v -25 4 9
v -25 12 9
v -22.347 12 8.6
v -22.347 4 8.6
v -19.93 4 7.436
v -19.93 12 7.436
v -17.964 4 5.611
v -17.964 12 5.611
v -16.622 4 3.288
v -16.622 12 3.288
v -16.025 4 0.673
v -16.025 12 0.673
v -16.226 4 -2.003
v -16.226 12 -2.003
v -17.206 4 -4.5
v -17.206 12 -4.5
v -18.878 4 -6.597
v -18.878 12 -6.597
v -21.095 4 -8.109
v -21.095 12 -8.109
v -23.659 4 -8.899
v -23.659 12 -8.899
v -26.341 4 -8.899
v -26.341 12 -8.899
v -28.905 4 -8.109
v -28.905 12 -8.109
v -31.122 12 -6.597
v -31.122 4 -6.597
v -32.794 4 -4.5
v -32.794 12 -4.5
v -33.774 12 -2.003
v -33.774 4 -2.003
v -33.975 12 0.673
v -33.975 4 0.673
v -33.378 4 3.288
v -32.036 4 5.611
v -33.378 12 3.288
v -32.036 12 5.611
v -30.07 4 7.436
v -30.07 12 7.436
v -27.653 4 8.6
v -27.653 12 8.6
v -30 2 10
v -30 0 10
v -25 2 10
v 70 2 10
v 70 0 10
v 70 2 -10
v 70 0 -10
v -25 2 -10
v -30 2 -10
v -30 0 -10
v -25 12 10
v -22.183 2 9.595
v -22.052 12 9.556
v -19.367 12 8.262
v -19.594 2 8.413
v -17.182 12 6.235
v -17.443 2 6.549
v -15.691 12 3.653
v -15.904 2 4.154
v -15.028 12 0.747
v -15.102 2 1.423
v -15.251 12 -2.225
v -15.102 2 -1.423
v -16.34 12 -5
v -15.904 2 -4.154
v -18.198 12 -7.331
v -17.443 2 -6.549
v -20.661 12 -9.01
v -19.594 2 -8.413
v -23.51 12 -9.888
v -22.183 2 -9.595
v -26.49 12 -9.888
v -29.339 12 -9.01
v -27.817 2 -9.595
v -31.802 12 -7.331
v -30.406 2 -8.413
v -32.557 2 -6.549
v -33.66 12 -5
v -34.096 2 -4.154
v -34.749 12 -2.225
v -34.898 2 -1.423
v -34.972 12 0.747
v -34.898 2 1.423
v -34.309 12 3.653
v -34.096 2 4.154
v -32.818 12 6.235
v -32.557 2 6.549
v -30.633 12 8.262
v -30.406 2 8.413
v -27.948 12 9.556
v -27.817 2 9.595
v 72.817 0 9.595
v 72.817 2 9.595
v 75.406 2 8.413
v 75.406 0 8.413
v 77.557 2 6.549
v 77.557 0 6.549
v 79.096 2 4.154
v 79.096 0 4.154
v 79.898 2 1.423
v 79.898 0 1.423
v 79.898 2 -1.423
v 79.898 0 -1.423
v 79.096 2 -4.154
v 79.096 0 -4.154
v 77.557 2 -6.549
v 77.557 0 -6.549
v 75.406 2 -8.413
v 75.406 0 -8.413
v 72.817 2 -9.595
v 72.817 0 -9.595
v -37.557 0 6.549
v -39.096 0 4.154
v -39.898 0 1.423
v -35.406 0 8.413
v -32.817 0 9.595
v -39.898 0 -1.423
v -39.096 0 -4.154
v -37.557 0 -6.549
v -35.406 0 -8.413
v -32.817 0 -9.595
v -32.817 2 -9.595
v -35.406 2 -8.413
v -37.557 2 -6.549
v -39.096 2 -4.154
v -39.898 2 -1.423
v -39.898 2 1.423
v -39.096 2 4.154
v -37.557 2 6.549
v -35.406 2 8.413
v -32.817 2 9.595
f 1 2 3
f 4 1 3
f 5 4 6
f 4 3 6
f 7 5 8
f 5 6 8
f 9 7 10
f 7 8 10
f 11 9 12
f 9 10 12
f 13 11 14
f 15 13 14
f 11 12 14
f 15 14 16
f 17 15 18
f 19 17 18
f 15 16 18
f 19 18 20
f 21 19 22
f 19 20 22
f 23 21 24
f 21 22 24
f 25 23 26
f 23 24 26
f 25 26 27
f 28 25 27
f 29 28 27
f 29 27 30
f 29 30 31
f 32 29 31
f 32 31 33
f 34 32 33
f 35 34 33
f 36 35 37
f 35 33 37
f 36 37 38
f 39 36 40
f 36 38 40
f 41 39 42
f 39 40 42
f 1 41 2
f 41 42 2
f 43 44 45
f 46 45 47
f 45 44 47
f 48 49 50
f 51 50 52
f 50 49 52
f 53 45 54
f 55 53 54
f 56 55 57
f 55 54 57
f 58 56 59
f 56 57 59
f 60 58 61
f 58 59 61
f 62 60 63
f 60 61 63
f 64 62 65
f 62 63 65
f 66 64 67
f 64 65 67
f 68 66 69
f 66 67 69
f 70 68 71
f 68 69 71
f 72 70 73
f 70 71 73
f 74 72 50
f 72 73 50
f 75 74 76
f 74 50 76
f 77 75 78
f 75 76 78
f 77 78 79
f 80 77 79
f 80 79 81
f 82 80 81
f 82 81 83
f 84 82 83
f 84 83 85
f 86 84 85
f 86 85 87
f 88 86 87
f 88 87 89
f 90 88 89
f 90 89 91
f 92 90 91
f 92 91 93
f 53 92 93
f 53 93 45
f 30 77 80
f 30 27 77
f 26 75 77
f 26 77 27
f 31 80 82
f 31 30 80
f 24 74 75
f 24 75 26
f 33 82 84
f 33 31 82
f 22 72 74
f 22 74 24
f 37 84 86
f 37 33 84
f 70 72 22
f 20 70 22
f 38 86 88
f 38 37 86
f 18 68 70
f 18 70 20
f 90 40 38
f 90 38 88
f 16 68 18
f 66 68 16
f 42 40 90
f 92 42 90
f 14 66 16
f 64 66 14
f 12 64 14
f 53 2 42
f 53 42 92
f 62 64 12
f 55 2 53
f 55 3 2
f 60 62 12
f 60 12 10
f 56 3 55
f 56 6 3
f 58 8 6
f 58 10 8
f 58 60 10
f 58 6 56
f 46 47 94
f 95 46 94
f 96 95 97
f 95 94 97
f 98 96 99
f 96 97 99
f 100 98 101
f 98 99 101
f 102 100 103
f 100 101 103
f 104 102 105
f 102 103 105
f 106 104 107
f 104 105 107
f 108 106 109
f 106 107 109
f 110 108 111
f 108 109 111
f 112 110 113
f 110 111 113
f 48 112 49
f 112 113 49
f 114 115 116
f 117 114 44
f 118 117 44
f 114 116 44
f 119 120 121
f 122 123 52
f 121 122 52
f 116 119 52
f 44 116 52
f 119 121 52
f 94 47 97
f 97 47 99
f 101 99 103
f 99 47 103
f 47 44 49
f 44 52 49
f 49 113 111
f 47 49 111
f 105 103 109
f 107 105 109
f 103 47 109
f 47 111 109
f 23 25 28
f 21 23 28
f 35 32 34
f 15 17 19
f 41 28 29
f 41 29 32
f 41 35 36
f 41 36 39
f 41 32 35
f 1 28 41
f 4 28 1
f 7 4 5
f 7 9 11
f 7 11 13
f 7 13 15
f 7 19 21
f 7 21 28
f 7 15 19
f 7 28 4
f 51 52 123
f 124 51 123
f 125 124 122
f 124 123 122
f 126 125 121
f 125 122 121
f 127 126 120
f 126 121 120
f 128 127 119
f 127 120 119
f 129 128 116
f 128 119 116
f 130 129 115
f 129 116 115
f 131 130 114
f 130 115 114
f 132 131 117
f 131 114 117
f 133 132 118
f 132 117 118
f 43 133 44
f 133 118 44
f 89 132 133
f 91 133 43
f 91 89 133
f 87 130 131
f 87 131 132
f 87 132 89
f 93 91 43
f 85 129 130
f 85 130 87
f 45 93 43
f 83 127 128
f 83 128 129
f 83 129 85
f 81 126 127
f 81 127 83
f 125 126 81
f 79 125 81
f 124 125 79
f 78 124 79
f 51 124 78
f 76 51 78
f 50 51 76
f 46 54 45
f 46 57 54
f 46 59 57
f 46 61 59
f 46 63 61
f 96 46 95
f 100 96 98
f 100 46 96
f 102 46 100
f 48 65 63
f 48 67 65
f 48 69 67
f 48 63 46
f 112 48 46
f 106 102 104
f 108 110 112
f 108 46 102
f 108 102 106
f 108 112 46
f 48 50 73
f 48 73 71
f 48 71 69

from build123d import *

# Parameters (mm, degrees)
BOSS_EXTRUDE1_DEPTH = 2
SKETCH2_R           = 10
BOSS_EXTRUDE2_DEPTH = 10
SKETCH3_R           = 9
CUT_EXTRUDE1_DEPTH  = 8


with BuildPart() as part:
    # Sketch1 → Boss-Extrude1 (new body)
    with BuildSketch(Plane(origin=(0, 0, 0), x_dir=(1, 0, 0), z_dir=(0, 1, 0))):
        with BuildLine():
            Line((-30, -10), (70, -10))
            ThreePointArc((70, -10), (80, 0), (70, 10))
            Line((70, 10), (-30, 10))
            ThreePointArc((-30, 10), (-40, 0), (-30, -10))
        make_face()
    extrude(amount=BOSS_EXTRUDE1_DEPTH)

    # Sketch2 → Boss-Extrude2 (add)
    with BuildSketch(Plane(origin=(0, 2, 0), x_dir=(1, 0, 0), z_dir=(0, 1, 0))):
        with Locations(Location((-25, 0, 0), (0, 0, 270))):
            Circle(SKETCH2_R)
    extrude(amount=BOSS_EXTRUDE2_DEPTH)

    # Sketch3 → Cut-Extrude1 (cut)
    with BuildSketch(Plane(origin=(0, 12, 0), x_dir=(1, 0, 0), z_dir=(0, 1, 0))):
        with Locations(Location((-25, 0, 0), (0, 0, 270))):
            Circle(SKETCH3_R)
    extrude(amount=-CUT_EXTRUDE1_DEPTH, mode=Mode.SUBTRACT)


solid = part.part
